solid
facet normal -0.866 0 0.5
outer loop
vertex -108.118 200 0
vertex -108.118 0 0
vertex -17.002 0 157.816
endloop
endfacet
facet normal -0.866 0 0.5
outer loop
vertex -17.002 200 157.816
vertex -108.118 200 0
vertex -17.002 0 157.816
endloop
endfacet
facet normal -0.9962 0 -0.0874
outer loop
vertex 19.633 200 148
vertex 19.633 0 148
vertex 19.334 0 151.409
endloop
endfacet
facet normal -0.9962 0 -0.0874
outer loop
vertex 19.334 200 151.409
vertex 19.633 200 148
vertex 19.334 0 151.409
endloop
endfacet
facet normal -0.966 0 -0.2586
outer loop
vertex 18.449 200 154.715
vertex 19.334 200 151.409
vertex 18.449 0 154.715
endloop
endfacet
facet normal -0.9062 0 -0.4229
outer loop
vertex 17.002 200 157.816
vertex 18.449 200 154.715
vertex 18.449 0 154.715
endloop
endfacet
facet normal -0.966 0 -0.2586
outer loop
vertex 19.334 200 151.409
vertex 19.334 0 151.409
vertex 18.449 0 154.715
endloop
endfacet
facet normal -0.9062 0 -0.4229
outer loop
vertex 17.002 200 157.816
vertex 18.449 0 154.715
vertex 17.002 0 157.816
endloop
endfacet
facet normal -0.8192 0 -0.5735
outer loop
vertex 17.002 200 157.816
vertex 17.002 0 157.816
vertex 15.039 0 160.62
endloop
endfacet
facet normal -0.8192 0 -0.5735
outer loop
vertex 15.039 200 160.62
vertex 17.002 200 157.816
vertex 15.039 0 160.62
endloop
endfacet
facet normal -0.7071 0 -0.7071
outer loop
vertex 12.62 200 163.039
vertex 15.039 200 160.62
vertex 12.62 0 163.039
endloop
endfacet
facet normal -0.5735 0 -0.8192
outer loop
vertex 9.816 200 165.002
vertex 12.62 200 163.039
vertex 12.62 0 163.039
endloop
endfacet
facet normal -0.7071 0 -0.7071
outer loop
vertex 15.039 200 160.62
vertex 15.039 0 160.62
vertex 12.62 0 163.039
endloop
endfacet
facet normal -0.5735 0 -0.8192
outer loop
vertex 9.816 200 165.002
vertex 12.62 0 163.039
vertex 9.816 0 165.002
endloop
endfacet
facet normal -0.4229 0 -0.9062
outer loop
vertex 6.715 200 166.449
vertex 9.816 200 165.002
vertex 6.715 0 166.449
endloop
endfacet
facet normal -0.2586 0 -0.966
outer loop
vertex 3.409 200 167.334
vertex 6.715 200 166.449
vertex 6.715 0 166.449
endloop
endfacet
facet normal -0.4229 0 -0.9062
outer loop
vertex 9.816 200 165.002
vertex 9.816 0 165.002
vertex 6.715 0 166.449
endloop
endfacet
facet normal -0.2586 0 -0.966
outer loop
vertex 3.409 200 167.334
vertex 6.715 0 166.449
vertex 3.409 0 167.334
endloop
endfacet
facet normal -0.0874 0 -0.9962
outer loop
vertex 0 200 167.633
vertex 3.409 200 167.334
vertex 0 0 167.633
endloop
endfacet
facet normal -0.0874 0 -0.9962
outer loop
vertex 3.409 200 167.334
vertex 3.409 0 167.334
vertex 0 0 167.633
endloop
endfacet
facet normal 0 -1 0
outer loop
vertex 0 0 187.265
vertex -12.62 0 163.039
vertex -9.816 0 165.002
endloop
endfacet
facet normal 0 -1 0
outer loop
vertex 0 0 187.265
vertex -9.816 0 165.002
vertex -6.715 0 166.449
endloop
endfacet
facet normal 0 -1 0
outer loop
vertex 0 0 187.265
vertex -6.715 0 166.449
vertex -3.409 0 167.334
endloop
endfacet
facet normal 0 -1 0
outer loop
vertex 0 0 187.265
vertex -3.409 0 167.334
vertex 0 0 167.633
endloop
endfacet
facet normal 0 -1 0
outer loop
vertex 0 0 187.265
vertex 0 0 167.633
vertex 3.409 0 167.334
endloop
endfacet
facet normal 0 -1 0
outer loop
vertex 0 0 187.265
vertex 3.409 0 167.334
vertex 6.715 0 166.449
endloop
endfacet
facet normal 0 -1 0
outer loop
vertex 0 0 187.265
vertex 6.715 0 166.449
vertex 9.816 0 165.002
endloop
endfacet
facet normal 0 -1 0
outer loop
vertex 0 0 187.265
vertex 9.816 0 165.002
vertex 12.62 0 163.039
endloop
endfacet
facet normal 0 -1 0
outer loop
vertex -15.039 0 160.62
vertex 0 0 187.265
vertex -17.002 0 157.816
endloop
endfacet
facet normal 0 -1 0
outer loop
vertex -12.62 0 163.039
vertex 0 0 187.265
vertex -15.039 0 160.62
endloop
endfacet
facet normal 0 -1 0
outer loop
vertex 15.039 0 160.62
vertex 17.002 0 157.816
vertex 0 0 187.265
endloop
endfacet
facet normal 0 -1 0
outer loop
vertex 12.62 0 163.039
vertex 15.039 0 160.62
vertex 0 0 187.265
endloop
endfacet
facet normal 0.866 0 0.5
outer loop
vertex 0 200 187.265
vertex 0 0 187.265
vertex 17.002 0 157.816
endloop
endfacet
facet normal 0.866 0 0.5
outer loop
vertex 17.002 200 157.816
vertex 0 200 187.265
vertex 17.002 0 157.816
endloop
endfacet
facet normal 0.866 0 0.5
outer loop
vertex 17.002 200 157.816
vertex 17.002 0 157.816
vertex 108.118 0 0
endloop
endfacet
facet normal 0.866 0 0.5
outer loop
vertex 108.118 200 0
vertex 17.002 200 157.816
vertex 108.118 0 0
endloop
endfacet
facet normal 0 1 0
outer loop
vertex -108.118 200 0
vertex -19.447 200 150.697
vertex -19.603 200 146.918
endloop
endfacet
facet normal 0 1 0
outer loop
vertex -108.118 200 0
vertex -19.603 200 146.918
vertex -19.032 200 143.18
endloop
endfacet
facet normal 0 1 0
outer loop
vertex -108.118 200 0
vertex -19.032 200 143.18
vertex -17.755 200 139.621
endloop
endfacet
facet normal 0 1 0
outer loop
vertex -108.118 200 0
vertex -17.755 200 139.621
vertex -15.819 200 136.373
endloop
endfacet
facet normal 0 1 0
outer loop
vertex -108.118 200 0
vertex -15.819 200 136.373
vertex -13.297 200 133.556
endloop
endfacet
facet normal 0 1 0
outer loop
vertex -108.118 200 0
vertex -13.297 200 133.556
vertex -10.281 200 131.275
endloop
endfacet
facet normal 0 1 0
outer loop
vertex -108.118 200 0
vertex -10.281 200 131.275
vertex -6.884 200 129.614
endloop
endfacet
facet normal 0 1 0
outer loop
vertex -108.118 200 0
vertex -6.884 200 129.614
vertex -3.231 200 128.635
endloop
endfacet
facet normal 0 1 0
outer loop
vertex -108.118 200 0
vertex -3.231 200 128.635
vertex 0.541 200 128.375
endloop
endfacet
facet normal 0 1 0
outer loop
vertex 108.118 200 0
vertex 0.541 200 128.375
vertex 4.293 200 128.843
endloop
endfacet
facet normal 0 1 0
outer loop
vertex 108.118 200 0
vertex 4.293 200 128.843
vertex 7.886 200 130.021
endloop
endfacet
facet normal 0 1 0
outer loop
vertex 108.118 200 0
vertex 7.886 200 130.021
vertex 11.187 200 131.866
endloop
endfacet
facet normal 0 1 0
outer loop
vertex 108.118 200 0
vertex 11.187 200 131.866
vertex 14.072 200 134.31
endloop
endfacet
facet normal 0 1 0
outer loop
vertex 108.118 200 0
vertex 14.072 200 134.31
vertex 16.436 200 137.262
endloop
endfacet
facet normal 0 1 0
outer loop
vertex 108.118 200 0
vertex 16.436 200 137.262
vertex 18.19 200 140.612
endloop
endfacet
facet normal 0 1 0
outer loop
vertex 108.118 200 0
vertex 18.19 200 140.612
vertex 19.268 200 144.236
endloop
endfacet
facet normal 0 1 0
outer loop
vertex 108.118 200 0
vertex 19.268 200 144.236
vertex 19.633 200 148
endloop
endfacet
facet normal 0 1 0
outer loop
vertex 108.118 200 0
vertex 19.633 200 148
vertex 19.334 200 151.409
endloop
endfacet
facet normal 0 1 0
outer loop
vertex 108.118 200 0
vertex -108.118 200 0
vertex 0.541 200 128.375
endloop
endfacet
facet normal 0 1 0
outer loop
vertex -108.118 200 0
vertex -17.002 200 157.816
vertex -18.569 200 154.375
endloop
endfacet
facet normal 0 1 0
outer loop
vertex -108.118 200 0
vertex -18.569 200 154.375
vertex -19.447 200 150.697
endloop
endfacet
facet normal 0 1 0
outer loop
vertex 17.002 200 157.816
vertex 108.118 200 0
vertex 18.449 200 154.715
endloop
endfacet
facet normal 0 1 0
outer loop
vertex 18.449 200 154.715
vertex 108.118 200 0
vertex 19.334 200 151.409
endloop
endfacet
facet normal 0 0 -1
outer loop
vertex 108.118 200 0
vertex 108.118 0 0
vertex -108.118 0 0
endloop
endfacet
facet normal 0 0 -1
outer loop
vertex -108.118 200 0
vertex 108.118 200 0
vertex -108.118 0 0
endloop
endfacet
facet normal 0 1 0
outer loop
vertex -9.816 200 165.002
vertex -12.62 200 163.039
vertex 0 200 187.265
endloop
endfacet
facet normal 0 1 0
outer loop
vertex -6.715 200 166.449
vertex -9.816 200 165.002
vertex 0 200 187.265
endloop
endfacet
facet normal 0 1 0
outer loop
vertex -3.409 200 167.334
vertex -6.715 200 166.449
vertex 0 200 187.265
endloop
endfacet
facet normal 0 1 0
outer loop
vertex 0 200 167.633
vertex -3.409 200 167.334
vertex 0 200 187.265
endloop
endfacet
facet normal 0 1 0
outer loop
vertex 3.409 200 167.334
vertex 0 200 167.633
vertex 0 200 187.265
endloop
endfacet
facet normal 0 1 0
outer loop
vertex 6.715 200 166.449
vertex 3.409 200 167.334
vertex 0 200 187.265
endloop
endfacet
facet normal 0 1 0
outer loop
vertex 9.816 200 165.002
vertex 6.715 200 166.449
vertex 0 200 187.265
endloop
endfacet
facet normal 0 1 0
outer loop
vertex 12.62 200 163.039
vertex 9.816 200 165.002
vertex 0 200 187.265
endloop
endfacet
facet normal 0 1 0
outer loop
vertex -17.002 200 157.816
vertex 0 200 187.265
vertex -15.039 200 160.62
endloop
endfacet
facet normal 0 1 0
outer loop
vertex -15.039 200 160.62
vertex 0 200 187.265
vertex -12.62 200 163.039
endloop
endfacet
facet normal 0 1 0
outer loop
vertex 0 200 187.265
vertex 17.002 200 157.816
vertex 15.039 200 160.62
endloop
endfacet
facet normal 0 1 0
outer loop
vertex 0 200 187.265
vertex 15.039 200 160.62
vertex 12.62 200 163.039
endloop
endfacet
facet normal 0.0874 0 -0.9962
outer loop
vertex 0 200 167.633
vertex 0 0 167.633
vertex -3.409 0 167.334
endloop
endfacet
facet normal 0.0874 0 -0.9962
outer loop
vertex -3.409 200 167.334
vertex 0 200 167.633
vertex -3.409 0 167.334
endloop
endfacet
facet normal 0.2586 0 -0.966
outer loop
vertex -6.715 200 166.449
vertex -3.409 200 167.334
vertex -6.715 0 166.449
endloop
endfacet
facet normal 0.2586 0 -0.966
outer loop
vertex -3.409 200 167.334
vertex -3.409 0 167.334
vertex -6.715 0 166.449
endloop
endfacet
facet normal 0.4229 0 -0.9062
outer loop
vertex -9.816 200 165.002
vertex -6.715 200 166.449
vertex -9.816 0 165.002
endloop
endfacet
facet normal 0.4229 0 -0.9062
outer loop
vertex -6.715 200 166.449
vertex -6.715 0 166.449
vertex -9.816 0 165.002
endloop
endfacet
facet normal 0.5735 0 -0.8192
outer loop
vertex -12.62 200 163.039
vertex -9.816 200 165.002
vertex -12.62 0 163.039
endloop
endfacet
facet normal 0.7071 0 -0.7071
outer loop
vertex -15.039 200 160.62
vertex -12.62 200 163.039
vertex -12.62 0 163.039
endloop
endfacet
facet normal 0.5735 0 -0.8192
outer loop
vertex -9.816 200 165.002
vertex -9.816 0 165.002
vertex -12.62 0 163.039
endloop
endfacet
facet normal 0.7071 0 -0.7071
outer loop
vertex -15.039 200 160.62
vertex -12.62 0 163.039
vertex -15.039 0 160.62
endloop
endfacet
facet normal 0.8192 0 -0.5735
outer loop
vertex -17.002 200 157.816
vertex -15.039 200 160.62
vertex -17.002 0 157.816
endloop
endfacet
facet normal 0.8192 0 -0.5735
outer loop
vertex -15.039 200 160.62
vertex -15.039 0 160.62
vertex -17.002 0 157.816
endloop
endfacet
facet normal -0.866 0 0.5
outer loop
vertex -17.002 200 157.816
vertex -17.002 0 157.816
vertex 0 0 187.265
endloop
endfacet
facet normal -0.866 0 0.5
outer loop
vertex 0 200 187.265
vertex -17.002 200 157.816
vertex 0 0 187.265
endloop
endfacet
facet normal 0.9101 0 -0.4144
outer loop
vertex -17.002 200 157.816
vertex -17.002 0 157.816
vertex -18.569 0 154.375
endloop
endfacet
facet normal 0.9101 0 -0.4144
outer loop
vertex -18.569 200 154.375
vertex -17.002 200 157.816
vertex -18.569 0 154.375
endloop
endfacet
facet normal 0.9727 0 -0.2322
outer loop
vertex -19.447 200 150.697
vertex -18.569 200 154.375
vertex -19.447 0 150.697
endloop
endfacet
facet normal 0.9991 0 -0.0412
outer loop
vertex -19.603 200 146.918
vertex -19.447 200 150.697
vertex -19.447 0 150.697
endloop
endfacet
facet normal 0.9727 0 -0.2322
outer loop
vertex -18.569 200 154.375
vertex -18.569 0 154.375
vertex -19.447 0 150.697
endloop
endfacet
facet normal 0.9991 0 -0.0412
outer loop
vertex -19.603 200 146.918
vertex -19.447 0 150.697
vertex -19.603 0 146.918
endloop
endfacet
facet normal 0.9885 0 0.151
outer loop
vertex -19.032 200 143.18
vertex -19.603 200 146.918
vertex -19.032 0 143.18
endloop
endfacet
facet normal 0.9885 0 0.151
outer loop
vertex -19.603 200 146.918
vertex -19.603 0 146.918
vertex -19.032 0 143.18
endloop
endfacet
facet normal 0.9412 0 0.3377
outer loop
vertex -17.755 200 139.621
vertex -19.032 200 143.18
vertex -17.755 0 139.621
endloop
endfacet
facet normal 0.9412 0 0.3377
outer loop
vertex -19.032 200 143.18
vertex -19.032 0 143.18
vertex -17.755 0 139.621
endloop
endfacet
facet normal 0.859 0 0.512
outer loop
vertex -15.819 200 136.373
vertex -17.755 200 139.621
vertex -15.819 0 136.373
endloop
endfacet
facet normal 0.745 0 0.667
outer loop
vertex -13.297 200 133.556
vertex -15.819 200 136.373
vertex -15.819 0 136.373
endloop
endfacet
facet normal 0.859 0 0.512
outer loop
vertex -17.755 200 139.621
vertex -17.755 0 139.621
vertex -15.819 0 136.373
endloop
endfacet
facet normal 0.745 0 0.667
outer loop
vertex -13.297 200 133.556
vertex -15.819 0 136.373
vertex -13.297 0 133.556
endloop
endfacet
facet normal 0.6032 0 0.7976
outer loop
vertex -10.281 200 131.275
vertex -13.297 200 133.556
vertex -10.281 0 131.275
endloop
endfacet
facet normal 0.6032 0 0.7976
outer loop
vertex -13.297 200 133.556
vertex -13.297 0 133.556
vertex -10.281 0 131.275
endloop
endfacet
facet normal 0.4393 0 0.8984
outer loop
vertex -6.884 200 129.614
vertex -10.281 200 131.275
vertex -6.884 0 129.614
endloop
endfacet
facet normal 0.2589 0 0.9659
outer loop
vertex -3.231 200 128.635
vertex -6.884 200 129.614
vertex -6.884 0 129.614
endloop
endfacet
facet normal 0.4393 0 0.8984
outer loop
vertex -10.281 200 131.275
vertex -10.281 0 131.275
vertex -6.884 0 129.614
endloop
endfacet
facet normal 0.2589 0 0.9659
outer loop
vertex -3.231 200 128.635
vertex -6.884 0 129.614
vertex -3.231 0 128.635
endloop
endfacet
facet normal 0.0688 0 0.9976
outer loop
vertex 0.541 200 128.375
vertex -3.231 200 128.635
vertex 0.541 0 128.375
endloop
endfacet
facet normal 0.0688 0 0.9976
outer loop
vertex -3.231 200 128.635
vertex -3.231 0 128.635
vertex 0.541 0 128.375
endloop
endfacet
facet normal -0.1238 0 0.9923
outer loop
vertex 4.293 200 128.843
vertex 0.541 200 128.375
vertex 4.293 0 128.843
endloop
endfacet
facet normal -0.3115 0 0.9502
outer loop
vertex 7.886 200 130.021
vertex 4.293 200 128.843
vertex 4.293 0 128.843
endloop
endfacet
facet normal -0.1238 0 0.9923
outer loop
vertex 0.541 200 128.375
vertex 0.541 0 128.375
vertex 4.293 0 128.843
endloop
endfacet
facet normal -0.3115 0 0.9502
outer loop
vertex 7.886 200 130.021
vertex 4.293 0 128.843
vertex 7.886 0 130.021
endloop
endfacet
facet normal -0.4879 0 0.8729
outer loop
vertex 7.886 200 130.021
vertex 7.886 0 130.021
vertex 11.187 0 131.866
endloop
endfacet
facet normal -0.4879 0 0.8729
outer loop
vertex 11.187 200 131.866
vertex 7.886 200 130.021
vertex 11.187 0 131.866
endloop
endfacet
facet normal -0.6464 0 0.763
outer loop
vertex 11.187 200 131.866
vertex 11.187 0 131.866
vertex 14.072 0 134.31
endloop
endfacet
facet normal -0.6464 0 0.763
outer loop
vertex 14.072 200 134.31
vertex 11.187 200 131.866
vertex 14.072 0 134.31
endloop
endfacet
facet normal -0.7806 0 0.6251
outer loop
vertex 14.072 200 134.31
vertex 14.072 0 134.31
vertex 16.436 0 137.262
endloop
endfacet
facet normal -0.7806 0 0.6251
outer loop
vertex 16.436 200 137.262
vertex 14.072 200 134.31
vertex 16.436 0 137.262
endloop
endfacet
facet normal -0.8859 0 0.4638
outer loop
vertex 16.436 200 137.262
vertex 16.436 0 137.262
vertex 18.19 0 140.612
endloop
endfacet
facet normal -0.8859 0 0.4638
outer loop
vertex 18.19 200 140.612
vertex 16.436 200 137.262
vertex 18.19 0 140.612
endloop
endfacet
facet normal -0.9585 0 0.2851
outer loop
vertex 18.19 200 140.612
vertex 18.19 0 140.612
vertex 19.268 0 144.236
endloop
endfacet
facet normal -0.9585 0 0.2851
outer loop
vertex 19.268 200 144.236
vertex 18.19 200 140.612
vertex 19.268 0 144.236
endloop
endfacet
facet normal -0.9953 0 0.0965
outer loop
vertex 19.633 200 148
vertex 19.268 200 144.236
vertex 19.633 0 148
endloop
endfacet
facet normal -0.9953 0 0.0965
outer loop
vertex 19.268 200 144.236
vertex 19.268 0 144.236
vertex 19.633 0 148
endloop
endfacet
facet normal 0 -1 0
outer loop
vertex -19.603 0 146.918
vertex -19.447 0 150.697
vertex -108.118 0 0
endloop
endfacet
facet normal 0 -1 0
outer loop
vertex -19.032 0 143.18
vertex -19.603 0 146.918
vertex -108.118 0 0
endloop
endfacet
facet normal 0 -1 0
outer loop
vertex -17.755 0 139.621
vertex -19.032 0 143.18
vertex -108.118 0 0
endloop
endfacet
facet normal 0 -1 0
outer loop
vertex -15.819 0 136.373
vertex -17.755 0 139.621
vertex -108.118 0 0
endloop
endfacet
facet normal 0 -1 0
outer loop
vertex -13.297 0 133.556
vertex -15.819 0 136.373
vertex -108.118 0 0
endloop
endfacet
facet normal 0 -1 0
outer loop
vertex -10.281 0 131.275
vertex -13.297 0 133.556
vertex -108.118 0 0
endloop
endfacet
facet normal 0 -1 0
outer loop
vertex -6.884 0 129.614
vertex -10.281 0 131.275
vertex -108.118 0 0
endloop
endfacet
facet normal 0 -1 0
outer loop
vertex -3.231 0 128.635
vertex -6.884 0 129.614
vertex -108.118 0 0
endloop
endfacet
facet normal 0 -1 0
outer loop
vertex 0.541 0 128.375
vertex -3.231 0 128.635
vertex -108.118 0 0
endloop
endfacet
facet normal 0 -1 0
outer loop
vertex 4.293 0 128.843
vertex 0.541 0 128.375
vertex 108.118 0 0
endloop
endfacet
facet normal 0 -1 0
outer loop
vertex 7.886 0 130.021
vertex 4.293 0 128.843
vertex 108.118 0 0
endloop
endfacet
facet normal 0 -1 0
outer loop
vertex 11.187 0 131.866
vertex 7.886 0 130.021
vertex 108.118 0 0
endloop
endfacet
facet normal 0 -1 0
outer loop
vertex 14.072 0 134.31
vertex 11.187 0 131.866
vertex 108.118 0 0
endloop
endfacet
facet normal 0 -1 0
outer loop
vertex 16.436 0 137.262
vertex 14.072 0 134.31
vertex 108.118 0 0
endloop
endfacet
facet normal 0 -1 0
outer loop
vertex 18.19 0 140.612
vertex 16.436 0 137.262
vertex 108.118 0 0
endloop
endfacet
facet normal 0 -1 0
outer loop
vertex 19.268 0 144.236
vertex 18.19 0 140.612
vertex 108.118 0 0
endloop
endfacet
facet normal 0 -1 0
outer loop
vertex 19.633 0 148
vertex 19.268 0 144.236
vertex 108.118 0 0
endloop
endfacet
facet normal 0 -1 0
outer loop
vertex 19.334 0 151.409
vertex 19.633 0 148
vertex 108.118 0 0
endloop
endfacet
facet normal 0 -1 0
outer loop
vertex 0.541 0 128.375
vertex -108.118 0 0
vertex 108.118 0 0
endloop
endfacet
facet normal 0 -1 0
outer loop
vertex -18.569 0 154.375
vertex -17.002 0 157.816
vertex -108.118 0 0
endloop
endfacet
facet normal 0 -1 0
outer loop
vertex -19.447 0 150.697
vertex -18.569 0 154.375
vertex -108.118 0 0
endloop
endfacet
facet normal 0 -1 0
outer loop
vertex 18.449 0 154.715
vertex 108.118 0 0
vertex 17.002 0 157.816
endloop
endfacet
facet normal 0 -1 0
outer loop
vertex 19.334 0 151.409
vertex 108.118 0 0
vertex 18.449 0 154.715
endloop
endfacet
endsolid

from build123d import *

# Parameters (mm, degrees)
BOSS_EXTRUDE1_DEPTH = 200


with BuildPart() as part:
    # Sketch1 → Boss-Extrude1 (new body)
    with BuildSketch(Plane(origin=(0, 0, 0), x_dir=(1, 0, 0), z_dir=(0, 1, 0))):
        with BuildLine():
            Line((108.1176749, 0), (0, 0))
            Line((0, 0), (0, -128.367346939))
            ThreePointArc((0, -128.367346939), (13.882382112, -134.117617888), (19.632653061, -148))
            ThreePointArc((19.632653061, -148), (18.963686701, -153.081304254), (17.002376569, -157.816326056))
            Line((17.002376569, -157.816326056), (108.1176749, 0))
        make_face()
        with BuildLine():
            Line((0, 0), (-108.1176749, 0))
            Line((-108.1176749, 0), (-17.002376712, -157.816325807))
            ThreePointArc((-17.002376712, -157.816325807), (-17.002376086, -138.183673108), (0, -128.367346939))
            Line((0, -128.367346939), (0, 0))
        make_face()
        with BuildLine():
            ThreePointArc((0, -167.632653061), (-9.816326892, -165.002376086), (-17.002376712, -157.816325807))
            Line((-17.002376712, -157.816325807), (0, -187.265306122))
            Line((0, -187.265306122), (0, -167.632653061))
        make_face()
        with BuildLine():
            Line((0, -167.632653061), (0, -187.265306122))
            Line((0, -187.265306122), (17.002376569, -157.816326056))
            ThreePointArc((17.002376569, -157.816326056), (9.816326768, -165.002376158), (0, -167.632653061))
        make_face()
    extrude(amount=BOSS_EXTRUDE1_DEPTH)


solid = part.part
